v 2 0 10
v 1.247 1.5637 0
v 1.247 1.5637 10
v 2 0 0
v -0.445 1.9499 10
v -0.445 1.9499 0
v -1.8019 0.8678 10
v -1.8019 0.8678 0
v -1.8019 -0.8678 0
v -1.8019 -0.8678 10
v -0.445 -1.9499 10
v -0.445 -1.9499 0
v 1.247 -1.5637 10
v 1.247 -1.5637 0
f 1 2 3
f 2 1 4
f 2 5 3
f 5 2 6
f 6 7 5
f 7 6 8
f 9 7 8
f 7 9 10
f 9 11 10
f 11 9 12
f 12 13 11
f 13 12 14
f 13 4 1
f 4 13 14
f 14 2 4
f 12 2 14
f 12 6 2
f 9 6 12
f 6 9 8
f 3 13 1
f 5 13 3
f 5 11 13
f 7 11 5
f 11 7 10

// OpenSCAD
// Unit of length: Unit.MM
cylinder(h = 10.0, d = 4.0, center = false);
